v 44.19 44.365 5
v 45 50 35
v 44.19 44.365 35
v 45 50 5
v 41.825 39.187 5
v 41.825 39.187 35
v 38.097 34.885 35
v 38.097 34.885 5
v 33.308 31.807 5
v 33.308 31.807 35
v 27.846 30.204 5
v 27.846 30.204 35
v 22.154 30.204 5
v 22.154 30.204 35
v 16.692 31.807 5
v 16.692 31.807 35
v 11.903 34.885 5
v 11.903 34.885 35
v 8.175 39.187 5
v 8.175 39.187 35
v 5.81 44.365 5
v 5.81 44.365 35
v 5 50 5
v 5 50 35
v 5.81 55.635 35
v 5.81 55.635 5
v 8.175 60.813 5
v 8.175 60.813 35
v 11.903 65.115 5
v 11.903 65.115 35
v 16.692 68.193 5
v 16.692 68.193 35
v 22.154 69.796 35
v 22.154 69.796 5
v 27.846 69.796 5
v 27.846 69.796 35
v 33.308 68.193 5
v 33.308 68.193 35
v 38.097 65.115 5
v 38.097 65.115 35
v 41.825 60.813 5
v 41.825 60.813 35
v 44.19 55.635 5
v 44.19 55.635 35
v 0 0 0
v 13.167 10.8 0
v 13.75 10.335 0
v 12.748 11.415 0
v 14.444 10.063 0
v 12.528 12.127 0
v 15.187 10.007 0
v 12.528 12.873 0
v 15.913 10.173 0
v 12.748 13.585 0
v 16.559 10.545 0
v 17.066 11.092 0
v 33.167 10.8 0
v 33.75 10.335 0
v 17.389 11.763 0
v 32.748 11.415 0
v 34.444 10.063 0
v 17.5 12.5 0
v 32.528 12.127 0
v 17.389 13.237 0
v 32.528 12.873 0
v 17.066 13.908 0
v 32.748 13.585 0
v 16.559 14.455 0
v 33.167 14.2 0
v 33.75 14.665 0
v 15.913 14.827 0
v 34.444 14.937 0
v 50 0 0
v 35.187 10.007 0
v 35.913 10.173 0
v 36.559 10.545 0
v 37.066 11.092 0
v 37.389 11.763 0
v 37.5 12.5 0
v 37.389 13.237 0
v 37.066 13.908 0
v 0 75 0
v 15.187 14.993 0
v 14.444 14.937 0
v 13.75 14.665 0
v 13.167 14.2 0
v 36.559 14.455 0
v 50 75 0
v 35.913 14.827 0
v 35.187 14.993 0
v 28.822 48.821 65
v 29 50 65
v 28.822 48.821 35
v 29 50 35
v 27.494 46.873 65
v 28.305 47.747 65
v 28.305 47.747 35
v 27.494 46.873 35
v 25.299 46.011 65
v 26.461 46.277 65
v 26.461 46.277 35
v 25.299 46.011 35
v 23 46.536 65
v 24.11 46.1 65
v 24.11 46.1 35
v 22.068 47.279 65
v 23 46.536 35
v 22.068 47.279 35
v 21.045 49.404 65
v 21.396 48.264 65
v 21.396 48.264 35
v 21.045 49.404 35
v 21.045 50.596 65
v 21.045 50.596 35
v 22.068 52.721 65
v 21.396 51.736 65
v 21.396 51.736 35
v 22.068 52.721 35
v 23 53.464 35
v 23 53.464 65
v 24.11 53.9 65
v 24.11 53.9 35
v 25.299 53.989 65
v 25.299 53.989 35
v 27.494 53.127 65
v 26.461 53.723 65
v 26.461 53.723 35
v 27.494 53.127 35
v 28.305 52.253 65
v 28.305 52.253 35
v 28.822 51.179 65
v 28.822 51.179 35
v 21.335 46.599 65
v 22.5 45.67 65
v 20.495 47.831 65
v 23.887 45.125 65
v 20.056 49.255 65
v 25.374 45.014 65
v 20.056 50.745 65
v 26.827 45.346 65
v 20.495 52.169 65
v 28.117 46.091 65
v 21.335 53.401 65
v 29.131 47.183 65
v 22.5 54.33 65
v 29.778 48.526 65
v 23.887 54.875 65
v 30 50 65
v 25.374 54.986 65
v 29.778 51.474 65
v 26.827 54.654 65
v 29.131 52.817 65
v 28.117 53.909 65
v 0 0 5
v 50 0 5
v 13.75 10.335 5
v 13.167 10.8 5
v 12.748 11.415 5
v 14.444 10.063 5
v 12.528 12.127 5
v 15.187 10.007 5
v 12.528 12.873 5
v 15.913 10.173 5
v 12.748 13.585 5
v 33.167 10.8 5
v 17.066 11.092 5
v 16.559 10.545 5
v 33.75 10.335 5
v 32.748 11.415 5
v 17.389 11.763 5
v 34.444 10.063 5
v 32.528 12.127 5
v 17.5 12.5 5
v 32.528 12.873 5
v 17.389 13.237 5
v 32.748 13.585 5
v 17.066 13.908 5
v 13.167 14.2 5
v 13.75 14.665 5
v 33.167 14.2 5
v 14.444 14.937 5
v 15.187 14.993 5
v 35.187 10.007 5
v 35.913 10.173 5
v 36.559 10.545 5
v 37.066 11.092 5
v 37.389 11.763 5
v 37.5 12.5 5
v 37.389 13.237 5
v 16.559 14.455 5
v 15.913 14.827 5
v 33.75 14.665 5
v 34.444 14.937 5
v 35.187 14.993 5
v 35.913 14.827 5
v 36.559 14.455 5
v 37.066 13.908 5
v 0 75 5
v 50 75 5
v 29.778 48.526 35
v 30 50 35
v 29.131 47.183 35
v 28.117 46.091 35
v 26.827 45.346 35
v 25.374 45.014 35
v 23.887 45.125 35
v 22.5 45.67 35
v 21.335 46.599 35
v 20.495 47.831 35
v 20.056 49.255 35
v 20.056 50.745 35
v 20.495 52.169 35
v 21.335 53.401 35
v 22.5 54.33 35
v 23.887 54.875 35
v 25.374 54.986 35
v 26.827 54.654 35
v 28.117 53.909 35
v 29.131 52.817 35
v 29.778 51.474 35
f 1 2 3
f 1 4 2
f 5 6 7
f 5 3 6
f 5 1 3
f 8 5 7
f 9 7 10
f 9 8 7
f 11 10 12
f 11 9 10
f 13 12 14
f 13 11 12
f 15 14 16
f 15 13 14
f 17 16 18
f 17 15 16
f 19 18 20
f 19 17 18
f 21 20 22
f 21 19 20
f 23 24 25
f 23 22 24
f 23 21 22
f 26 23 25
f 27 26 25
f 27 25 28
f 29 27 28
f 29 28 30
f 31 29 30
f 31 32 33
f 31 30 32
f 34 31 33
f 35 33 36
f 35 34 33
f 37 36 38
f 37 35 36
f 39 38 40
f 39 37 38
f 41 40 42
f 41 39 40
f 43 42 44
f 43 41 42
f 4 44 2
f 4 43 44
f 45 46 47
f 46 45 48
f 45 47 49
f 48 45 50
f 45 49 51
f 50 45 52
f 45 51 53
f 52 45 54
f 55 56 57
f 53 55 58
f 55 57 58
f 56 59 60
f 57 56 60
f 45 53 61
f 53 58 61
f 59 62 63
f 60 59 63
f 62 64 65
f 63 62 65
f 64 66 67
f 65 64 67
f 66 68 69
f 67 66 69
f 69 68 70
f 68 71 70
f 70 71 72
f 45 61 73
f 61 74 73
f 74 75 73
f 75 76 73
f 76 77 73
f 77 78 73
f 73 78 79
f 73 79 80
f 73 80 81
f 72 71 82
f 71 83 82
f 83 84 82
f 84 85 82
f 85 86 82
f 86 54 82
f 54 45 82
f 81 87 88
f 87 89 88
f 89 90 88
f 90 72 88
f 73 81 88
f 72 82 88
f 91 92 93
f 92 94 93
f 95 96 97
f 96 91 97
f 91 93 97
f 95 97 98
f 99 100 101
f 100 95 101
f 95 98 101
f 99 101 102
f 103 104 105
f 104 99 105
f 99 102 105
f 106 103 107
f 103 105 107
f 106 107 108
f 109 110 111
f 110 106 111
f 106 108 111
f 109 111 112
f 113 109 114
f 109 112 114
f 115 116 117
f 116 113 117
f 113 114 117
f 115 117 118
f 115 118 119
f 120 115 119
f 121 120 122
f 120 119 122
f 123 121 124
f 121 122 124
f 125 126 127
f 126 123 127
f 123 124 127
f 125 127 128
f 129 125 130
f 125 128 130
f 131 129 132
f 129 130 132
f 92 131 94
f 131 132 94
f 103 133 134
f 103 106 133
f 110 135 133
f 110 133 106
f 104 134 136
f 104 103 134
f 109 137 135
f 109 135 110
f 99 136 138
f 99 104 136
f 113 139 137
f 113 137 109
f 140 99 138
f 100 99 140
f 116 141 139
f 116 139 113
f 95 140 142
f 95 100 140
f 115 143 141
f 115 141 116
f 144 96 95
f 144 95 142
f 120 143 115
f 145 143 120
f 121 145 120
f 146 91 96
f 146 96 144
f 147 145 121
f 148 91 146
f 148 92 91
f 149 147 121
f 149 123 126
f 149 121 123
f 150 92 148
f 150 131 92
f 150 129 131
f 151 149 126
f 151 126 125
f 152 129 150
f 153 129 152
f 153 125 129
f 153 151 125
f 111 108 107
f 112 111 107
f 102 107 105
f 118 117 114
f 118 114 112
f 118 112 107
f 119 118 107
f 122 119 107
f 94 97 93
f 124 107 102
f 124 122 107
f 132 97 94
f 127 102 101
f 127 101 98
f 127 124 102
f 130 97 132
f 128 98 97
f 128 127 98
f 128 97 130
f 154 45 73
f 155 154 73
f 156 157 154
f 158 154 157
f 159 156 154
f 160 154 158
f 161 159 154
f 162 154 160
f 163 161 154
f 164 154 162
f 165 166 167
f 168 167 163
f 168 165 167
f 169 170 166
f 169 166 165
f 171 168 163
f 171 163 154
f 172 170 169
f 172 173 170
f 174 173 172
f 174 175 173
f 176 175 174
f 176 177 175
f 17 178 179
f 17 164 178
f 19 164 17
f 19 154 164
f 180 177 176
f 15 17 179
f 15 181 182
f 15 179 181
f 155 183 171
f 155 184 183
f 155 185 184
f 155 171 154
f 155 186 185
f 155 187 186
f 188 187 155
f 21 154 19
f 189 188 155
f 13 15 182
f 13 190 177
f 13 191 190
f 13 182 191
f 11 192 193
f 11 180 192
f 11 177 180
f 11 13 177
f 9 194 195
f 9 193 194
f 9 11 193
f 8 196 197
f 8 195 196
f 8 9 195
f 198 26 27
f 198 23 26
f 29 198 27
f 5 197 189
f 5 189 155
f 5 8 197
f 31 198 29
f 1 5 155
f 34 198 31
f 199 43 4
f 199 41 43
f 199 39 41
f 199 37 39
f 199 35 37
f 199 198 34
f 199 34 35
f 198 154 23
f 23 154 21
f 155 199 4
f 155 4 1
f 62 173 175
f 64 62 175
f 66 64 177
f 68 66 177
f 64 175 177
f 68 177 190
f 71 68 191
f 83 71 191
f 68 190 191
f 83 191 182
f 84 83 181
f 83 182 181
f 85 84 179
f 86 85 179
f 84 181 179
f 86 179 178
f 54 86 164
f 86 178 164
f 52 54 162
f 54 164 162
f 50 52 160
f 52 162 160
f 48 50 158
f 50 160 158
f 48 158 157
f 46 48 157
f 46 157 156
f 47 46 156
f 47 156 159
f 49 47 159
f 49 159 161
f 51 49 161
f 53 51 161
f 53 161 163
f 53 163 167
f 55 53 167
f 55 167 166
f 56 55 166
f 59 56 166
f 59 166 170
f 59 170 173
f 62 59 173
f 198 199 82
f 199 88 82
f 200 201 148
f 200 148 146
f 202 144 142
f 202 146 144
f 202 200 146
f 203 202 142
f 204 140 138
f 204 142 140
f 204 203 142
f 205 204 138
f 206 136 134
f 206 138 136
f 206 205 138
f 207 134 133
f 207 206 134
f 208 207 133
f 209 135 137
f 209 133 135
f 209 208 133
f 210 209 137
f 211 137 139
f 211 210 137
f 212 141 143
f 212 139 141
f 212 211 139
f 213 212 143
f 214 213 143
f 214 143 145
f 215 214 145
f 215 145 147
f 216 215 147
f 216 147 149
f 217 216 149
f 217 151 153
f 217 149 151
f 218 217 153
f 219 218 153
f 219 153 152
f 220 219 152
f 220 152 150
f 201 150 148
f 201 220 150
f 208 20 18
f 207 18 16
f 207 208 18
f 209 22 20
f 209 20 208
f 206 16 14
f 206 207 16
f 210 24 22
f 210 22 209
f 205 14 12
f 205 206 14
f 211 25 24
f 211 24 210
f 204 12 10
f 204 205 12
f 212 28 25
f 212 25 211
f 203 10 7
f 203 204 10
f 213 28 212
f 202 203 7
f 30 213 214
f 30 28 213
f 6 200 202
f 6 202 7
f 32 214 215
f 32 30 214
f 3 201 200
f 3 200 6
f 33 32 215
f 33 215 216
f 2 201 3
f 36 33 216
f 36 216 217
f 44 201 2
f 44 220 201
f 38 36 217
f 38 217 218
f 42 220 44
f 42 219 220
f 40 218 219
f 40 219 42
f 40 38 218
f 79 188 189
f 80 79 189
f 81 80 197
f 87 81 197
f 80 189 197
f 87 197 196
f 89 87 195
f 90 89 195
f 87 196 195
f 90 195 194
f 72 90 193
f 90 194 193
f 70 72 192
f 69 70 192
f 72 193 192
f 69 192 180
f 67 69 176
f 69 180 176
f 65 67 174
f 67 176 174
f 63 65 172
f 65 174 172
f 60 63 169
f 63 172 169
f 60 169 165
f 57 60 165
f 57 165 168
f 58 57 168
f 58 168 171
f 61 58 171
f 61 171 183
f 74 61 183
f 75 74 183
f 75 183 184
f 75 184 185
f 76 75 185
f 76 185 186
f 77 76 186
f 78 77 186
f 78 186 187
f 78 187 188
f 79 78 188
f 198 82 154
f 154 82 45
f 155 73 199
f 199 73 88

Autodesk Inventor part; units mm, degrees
ref_plane "YZ Plane" through (0, 0, 0) normal (1, 0, 0) x (0, 1, 0)
ref_plane "XZ Plane" through (0, 0, 0) normal (0, 1, 0) x (-1, 0, 0)
ref_plane "XY Plane" through (0, 0, 0) normal (0, 0, 1) x (1, 0, 0)
sketch "Sketch1" plane through (0, 0, 0) normal (0, 0, 1) x (1, 0, 0)
  line L0 (0, 0) -> (50, 0)
  line L1 (50, 0) -> (50, 75)
  line L2 (50, 75) -> (0, 75)
  line L3 (0, 75) -> (0, 0)
  dimension "d0" = 50
  dimension "d1" = 75
extrude "Extrusion1" add sketch "Sketch1" along normal blind 5
sketch "Sketch2" plane through (0, 0, 5) normal (0, 0, 1) x (1, 0, 0)
  line L0 (0, 0) -> (50, 0) projected
  line L1 (50, 75) -> (0, 75) projected
  line L2 (0, 0) -> (50, 0)
  line L3 (50, 0) -> (50, 75)
  line L4 (50, 75) -> (0, 75)
  line L5 (0, 75) -> (0, 0)
  circle A0 centre (25, 50) radius 20
  dimension "d4" = 40
  dimension "d5" = 25
extrude "Extrusion2" add sketch "Sketch2" along normal blind 30 contours A0
sketch "Sketch3" plane through (25, 50, 35) normal (0, 0, 1) x (1, 0, 0)
  circle A0 centre (0, 0) radius 4
  circle A1 centre (0, 0) radius 5
  point P0 (-25, -50)
  dimension "d8" = 8
  dimension "d9" = 10
extrude "Extrusion3" add sketch "Sketch3" along normal blind 30
sketch "Sketch4" plane through (0, 0, 5) normal (0, 0, 1) x (1, 0, 0)
  circle A0 centre (35, 12.5) radius 2.5
  circle A1 centre (15, 12.5) radius 2.5
  line L0 (0, 75) -> (0, 0) projected
  line L1 (50, 0) -> (50, 75) projected
  line L2 (0, 0) -> (50, 0) projected
  dimension "d12" = 5
  dimension "d13" = 5
  dimension "d14" = 15
  dimension "d15" = 15
  dimension "d16" = 12.5
  dimension "d17" = 12.5
extrude "Extrusion4" cut sketch "Sketch4" against normal blind 10
thread "Thread1" size "M5x0.8" class "6H" standard "ANSI Metric M Profile" full length
thread "Thread2" size "M5x0.8" class "6H" standard "ANSI Metric M Profile" full length
properties part number "Pump"
